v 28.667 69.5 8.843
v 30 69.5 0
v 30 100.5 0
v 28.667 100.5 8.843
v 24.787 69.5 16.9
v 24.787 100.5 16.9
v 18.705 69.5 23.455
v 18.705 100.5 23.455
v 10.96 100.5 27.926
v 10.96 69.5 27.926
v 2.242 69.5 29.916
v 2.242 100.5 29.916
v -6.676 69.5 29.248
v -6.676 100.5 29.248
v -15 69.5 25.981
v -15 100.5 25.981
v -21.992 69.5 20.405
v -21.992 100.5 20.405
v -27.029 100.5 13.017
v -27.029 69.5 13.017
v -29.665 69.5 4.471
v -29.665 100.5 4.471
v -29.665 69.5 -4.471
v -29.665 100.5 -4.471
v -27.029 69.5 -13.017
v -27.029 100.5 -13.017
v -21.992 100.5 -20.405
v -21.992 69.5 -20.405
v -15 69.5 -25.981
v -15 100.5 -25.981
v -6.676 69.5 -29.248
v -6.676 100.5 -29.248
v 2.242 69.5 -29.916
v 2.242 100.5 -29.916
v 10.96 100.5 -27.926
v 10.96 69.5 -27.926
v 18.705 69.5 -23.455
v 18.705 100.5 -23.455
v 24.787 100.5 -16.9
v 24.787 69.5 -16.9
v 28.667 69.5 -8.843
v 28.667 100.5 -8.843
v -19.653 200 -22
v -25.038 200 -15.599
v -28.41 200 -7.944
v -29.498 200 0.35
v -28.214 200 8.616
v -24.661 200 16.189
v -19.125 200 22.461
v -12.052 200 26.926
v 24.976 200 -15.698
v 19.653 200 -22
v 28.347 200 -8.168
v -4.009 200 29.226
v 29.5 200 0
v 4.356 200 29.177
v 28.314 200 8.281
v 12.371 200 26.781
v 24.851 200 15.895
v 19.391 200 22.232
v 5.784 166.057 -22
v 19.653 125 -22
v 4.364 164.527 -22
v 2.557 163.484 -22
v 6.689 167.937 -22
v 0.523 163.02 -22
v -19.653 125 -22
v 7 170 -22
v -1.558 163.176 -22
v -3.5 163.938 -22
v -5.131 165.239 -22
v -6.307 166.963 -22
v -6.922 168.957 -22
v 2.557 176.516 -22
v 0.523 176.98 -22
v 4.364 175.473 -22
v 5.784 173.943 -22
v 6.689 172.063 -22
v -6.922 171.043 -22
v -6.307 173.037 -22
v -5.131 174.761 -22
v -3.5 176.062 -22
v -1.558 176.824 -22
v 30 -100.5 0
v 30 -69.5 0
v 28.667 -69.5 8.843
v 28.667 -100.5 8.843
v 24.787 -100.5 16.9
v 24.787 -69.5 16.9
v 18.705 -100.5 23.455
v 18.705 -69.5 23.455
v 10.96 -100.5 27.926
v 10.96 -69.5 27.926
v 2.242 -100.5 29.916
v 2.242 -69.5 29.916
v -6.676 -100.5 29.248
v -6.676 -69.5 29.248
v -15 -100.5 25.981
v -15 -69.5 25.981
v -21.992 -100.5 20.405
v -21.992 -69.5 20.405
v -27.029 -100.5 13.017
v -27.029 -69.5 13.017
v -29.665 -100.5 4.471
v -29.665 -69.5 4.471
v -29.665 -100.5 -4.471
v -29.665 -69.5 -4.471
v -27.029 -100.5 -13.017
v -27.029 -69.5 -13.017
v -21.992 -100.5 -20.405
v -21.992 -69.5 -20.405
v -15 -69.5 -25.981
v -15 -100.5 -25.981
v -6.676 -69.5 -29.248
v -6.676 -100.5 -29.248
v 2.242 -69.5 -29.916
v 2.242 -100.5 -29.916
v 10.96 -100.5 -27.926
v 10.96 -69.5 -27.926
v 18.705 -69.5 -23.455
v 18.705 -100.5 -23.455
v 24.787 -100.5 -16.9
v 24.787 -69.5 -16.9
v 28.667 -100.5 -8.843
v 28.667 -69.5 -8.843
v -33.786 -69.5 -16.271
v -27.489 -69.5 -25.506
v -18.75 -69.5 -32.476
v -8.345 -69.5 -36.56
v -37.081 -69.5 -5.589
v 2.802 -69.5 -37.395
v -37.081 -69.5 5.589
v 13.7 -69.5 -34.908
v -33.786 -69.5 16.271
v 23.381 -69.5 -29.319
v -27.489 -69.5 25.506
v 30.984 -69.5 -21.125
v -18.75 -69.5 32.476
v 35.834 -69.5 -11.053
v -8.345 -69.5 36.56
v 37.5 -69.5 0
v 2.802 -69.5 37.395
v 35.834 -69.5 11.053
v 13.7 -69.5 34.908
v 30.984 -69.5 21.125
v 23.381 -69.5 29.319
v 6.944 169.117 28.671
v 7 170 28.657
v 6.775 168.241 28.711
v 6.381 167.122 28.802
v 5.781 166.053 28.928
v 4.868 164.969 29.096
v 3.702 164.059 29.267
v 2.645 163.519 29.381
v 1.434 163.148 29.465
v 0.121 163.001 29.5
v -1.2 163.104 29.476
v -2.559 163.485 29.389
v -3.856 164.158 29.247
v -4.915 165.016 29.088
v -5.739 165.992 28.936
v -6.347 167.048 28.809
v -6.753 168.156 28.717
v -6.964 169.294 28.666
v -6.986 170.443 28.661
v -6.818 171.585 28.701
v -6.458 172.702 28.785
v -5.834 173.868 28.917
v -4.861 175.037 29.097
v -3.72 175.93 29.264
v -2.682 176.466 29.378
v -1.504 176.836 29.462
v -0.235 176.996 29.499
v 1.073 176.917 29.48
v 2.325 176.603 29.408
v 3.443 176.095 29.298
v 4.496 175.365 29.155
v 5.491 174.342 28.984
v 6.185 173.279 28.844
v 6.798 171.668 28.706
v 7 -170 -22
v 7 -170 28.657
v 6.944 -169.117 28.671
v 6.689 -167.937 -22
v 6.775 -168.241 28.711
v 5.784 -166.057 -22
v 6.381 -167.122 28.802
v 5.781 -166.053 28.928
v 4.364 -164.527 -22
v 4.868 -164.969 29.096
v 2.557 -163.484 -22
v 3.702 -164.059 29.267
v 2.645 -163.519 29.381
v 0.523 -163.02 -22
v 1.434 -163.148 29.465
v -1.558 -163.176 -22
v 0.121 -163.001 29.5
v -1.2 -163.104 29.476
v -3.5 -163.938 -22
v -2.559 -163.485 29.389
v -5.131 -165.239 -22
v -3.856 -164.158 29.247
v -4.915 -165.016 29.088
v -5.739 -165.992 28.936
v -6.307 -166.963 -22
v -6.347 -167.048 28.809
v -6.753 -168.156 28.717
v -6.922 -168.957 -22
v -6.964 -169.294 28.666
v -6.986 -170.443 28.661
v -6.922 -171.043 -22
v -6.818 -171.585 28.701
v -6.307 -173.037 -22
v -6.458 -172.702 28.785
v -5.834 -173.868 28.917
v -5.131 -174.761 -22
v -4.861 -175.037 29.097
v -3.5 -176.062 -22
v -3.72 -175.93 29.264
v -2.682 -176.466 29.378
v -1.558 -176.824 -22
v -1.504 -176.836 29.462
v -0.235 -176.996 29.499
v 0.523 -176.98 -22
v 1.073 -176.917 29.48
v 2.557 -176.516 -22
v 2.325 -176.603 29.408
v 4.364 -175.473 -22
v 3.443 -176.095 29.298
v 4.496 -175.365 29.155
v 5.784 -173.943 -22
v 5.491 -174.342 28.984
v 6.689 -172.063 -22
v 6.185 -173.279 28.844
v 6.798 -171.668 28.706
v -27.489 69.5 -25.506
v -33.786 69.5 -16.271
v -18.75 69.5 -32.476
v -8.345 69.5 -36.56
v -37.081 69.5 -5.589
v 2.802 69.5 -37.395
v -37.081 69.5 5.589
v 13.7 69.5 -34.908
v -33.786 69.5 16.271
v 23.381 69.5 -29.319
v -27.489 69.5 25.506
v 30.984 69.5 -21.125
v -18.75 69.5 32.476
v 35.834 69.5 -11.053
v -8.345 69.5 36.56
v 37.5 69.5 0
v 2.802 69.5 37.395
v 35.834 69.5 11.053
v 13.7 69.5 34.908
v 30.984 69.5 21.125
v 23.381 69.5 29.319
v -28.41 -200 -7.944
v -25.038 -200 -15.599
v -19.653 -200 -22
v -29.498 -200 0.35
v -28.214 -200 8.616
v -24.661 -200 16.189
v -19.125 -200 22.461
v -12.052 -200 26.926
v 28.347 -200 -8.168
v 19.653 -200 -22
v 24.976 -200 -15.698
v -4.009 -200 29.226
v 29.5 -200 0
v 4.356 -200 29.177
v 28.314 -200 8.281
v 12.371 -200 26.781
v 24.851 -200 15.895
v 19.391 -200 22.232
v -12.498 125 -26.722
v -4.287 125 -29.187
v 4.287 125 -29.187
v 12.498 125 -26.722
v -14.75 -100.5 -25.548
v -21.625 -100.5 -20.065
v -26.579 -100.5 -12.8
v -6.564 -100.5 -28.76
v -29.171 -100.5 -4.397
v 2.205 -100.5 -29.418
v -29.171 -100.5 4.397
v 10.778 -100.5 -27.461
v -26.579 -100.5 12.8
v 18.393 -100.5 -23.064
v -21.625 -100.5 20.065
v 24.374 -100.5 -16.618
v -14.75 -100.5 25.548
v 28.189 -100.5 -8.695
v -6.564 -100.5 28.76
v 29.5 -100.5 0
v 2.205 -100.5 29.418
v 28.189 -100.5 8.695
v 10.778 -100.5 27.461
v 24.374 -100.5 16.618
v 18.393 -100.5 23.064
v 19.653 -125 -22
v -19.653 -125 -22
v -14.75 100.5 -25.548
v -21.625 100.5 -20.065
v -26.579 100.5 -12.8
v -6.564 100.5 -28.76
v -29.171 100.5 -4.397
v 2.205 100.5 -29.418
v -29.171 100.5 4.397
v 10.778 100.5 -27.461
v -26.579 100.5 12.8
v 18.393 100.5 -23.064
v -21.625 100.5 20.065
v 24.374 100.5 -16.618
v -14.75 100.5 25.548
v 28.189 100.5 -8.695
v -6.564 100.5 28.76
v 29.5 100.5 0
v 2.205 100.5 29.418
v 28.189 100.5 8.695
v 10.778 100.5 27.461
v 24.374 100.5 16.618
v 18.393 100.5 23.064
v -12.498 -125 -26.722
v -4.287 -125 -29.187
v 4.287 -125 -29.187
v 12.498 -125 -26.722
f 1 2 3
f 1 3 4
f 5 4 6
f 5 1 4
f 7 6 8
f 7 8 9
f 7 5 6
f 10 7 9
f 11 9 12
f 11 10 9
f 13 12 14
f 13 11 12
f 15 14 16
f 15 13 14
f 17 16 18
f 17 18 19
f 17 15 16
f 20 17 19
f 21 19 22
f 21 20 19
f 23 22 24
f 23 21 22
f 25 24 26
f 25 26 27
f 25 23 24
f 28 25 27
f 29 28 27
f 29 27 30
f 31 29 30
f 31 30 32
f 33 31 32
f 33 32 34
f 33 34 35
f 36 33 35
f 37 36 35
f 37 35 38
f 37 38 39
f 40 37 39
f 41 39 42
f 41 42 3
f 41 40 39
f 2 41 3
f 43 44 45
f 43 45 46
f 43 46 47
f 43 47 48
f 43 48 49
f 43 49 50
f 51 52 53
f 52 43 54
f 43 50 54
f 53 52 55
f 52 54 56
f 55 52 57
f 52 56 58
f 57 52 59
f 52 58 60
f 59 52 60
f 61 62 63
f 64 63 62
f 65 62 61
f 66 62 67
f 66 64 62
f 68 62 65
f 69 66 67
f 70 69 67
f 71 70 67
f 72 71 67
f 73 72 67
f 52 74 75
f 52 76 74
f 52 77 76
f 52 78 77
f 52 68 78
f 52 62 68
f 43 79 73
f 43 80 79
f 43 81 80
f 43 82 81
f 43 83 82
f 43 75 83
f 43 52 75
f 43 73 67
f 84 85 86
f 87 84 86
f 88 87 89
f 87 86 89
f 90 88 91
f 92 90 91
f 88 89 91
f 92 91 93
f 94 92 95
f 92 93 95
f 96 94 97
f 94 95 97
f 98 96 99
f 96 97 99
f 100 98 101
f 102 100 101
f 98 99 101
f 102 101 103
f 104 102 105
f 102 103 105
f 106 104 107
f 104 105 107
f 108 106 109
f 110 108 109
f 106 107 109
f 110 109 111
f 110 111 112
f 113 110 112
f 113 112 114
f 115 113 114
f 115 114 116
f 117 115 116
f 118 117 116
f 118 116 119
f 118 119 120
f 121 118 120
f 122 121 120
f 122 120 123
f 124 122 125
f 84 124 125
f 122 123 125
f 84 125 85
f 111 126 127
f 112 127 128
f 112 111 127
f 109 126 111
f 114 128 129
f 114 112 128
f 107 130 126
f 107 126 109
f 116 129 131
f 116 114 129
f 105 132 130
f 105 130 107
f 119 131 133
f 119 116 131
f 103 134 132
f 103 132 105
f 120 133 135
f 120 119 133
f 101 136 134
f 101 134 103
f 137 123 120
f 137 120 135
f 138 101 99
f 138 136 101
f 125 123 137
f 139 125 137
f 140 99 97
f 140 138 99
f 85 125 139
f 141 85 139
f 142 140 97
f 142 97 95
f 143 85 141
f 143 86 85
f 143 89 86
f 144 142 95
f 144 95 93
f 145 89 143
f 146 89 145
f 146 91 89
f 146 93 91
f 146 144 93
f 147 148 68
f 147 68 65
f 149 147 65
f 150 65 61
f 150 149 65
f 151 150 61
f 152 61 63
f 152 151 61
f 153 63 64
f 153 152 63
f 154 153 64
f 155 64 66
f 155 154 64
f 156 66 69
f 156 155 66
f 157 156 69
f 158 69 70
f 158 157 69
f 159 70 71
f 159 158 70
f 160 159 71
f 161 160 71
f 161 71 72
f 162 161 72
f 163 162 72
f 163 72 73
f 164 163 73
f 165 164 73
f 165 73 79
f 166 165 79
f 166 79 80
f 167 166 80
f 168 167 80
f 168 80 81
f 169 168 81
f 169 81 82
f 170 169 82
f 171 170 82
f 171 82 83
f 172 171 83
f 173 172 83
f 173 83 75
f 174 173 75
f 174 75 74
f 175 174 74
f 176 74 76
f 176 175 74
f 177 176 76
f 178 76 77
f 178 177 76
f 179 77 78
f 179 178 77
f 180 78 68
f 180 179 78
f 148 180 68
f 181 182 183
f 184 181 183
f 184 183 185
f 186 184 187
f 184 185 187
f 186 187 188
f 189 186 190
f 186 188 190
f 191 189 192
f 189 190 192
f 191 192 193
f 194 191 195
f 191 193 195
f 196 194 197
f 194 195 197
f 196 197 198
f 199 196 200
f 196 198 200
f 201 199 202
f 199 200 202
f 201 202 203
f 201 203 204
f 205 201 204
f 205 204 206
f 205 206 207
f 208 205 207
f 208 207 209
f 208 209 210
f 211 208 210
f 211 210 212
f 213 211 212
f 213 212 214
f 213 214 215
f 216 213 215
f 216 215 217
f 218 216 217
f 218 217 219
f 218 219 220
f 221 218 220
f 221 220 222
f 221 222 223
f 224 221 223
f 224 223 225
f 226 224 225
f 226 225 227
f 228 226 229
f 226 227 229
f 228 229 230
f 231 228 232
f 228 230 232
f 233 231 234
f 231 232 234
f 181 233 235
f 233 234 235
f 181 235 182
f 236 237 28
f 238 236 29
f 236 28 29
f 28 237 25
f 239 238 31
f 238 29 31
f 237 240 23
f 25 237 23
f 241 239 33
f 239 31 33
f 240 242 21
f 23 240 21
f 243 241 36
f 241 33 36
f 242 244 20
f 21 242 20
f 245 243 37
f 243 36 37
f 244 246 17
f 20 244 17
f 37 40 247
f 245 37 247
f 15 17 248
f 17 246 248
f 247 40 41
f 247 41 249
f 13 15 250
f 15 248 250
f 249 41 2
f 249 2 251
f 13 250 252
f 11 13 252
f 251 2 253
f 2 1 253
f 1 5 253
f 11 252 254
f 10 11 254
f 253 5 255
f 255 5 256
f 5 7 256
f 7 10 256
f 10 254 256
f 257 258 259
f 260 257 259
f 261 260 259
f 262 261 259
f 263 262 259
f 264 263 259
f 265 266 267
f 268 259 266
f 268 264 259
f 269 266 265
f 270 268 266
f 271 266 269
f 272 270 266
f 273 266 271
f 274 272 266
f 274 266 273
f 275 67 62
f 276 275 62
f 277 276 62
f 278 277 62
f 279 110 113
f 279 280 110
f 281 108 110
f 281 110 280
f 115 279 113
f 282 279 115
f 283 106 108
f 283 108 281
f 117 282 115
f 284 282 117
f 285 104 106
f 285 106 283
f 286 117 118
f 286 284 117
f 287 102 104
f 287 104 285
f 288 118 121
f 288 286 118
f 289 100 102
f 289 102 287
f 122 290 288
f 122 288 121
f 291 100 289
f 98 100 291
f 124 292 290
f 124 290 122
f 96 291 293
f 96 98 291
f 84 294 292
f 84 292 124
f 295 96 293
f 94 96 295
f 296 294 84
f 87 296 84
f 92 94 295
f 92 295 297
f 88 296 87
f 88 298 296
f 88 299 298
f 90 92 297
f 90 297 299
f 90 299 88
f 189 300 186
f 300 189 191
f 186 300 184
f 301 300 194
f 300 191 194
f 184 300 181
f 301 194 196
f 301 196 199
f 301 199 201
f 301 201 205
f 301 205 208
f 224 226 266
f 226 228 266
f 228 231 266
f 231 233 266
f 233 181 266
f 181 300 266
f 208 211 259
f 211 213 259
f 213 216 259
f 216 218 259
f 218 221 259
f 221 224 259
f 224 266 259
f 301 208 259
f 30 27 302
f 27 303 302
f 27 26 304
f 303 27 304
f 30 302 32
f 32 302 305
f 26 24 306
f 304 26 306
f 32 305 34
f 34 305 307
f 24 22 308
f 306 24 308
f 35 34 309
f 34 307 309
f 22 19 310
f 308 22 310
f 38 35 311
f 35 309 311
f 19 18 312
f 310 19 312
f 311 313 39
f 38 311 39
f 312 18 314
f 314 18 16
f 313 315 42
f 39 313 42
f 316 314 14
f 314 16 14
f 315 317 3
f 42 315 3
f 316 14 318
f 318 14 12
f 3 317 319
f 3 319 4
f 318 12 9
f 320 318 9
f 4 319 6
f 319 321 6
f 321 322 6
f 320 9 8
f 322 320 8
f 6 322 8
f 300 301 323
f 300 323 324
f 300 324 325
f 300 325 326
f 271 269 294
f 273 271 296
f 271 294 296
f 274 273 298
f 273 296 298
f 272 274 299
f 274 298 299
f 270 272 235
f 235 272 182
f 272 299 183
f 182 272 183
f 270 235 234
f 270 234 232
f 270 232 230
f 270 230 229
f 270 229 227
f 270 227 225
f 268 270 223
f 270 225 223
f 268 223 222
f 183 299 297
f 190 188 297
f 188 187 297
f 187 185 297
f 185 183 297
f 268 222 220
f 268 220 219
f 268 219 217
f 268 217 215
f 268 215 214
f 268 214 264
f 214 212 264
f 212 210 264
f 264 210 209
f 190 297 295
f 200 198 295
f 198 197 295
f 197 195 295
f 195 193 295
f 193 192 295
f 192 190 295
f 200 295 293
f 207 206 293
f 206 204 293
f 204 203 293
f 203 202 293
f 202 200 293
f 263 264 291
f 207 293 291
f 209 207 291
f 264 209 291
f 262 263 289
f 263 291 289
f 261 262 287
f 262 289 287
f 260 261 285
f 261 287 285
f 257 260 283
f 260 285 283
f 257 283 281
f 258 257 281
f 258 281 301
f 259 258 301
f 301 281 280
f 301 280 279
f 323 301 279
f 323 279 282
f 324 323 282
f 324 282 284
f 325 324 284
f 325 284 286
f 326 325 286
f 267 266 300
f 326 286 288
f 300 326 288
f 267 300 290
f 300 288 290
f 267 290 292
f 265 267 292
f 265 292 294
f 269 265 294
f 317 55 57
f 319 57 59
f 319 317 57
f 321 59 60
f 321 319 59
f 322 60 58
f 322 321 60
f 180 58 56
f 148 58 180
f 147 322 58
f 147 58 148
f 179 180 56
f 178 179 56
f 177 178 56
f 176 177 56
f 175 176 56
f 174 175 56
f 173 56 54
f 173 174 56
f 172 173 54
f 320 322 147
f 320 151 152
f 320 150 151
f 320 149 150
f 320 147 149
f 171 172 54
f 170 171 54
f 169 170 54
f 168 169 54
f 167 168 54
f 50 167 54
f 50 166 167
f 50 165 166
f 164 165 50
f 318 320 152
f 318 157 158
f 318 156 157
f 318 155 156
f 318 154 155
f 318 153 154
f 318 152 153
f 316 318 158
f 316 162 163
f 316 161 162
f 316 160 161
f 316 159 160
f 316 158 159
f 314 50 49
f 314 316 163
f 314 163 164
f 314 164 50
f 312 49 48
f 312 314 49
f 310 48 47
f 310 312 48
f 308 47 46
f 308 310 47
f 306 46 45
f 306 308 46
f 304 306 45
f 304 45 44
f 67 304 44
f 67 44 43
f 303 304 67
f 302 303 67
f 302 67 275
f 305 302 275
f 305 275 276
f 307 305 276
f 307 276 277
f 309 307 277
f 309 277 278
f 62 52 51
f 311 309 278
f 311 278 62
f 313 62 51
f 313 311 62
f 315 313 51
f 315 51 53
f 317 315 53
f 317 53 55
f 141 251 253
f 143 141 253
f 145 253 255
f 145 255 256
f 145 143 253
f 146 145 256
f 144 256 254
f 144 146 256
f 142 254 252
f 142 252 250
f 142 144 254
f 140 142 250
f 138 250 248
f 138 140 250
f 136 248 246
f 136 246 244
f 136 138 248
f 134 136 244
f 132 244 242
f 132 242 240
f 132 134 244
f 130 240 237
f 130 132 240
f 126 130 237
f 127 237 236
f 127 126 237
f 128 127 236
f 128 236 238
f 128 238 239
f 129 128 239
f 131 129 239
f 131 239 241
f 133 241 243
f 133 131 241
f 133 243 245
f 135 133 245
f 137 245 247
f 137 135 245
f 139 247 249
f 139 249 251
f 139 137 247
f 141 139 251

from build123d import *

# Parameters (mm, degrees)
F0_R      = 37.5
F1_DEPTH  = 69.5
F2_R      = 30
F3_DEPTH  = 31
F4_R      = 29.5
F5_DEPTH  = 99.5
F7_DEPTH  = 75
F10_R     = 7
F11_DEPTH = 67.001


with BuildPart() as f1:
    # F0 (on Front) → F1 (new body, symmetric)
    with BuildSketch(Plane.XZ):
        Circle(F0_R)
    extrude(amount=F1_DEPTH, both=True)

    # F2 (on face) → F3 (join)
    with BuildSketch(Plane.XZ.offset(69.5)):
        Circle(F2_R)
    extrude(amount=F3_DEPTH)

    # F4 (on face) → F5 (join)
    with BuildSketch(Plane.XZ.offset(100.5)):
        Circle(F4_R)
    extrude(amount=F5_DEPTH)

    # F6 (on face) → F7 (cut)
    with BuildSketch(Plane.XZ.offset(200)):
        with BuildLine():
            Line((19.653244007, -22), (-19.653244007, -22))
            ThreePointArc((-19.653244007, -22), (0, -29.5), (19.653244007, -22))
        make_face()
    extrude(amount=-F7_DEPTH, mode=Mode.SUBTRACT)

    # F10 (on plane+point) → F11 (cut, through all)
    with BuildSketch(Plane.XY.offset(29.5)):
        with Locations((0, -170)):
            Circle(F10_R)
    extrude(amount=-F11_DEPTH, mode=Mode.SUBTRACT)

    # F12: F1 across plane


with BuildPart() as f1_1:
    add(f1.part)
    add(f1.part.mirror(Plane.XZ))


solid = f1_1.part
